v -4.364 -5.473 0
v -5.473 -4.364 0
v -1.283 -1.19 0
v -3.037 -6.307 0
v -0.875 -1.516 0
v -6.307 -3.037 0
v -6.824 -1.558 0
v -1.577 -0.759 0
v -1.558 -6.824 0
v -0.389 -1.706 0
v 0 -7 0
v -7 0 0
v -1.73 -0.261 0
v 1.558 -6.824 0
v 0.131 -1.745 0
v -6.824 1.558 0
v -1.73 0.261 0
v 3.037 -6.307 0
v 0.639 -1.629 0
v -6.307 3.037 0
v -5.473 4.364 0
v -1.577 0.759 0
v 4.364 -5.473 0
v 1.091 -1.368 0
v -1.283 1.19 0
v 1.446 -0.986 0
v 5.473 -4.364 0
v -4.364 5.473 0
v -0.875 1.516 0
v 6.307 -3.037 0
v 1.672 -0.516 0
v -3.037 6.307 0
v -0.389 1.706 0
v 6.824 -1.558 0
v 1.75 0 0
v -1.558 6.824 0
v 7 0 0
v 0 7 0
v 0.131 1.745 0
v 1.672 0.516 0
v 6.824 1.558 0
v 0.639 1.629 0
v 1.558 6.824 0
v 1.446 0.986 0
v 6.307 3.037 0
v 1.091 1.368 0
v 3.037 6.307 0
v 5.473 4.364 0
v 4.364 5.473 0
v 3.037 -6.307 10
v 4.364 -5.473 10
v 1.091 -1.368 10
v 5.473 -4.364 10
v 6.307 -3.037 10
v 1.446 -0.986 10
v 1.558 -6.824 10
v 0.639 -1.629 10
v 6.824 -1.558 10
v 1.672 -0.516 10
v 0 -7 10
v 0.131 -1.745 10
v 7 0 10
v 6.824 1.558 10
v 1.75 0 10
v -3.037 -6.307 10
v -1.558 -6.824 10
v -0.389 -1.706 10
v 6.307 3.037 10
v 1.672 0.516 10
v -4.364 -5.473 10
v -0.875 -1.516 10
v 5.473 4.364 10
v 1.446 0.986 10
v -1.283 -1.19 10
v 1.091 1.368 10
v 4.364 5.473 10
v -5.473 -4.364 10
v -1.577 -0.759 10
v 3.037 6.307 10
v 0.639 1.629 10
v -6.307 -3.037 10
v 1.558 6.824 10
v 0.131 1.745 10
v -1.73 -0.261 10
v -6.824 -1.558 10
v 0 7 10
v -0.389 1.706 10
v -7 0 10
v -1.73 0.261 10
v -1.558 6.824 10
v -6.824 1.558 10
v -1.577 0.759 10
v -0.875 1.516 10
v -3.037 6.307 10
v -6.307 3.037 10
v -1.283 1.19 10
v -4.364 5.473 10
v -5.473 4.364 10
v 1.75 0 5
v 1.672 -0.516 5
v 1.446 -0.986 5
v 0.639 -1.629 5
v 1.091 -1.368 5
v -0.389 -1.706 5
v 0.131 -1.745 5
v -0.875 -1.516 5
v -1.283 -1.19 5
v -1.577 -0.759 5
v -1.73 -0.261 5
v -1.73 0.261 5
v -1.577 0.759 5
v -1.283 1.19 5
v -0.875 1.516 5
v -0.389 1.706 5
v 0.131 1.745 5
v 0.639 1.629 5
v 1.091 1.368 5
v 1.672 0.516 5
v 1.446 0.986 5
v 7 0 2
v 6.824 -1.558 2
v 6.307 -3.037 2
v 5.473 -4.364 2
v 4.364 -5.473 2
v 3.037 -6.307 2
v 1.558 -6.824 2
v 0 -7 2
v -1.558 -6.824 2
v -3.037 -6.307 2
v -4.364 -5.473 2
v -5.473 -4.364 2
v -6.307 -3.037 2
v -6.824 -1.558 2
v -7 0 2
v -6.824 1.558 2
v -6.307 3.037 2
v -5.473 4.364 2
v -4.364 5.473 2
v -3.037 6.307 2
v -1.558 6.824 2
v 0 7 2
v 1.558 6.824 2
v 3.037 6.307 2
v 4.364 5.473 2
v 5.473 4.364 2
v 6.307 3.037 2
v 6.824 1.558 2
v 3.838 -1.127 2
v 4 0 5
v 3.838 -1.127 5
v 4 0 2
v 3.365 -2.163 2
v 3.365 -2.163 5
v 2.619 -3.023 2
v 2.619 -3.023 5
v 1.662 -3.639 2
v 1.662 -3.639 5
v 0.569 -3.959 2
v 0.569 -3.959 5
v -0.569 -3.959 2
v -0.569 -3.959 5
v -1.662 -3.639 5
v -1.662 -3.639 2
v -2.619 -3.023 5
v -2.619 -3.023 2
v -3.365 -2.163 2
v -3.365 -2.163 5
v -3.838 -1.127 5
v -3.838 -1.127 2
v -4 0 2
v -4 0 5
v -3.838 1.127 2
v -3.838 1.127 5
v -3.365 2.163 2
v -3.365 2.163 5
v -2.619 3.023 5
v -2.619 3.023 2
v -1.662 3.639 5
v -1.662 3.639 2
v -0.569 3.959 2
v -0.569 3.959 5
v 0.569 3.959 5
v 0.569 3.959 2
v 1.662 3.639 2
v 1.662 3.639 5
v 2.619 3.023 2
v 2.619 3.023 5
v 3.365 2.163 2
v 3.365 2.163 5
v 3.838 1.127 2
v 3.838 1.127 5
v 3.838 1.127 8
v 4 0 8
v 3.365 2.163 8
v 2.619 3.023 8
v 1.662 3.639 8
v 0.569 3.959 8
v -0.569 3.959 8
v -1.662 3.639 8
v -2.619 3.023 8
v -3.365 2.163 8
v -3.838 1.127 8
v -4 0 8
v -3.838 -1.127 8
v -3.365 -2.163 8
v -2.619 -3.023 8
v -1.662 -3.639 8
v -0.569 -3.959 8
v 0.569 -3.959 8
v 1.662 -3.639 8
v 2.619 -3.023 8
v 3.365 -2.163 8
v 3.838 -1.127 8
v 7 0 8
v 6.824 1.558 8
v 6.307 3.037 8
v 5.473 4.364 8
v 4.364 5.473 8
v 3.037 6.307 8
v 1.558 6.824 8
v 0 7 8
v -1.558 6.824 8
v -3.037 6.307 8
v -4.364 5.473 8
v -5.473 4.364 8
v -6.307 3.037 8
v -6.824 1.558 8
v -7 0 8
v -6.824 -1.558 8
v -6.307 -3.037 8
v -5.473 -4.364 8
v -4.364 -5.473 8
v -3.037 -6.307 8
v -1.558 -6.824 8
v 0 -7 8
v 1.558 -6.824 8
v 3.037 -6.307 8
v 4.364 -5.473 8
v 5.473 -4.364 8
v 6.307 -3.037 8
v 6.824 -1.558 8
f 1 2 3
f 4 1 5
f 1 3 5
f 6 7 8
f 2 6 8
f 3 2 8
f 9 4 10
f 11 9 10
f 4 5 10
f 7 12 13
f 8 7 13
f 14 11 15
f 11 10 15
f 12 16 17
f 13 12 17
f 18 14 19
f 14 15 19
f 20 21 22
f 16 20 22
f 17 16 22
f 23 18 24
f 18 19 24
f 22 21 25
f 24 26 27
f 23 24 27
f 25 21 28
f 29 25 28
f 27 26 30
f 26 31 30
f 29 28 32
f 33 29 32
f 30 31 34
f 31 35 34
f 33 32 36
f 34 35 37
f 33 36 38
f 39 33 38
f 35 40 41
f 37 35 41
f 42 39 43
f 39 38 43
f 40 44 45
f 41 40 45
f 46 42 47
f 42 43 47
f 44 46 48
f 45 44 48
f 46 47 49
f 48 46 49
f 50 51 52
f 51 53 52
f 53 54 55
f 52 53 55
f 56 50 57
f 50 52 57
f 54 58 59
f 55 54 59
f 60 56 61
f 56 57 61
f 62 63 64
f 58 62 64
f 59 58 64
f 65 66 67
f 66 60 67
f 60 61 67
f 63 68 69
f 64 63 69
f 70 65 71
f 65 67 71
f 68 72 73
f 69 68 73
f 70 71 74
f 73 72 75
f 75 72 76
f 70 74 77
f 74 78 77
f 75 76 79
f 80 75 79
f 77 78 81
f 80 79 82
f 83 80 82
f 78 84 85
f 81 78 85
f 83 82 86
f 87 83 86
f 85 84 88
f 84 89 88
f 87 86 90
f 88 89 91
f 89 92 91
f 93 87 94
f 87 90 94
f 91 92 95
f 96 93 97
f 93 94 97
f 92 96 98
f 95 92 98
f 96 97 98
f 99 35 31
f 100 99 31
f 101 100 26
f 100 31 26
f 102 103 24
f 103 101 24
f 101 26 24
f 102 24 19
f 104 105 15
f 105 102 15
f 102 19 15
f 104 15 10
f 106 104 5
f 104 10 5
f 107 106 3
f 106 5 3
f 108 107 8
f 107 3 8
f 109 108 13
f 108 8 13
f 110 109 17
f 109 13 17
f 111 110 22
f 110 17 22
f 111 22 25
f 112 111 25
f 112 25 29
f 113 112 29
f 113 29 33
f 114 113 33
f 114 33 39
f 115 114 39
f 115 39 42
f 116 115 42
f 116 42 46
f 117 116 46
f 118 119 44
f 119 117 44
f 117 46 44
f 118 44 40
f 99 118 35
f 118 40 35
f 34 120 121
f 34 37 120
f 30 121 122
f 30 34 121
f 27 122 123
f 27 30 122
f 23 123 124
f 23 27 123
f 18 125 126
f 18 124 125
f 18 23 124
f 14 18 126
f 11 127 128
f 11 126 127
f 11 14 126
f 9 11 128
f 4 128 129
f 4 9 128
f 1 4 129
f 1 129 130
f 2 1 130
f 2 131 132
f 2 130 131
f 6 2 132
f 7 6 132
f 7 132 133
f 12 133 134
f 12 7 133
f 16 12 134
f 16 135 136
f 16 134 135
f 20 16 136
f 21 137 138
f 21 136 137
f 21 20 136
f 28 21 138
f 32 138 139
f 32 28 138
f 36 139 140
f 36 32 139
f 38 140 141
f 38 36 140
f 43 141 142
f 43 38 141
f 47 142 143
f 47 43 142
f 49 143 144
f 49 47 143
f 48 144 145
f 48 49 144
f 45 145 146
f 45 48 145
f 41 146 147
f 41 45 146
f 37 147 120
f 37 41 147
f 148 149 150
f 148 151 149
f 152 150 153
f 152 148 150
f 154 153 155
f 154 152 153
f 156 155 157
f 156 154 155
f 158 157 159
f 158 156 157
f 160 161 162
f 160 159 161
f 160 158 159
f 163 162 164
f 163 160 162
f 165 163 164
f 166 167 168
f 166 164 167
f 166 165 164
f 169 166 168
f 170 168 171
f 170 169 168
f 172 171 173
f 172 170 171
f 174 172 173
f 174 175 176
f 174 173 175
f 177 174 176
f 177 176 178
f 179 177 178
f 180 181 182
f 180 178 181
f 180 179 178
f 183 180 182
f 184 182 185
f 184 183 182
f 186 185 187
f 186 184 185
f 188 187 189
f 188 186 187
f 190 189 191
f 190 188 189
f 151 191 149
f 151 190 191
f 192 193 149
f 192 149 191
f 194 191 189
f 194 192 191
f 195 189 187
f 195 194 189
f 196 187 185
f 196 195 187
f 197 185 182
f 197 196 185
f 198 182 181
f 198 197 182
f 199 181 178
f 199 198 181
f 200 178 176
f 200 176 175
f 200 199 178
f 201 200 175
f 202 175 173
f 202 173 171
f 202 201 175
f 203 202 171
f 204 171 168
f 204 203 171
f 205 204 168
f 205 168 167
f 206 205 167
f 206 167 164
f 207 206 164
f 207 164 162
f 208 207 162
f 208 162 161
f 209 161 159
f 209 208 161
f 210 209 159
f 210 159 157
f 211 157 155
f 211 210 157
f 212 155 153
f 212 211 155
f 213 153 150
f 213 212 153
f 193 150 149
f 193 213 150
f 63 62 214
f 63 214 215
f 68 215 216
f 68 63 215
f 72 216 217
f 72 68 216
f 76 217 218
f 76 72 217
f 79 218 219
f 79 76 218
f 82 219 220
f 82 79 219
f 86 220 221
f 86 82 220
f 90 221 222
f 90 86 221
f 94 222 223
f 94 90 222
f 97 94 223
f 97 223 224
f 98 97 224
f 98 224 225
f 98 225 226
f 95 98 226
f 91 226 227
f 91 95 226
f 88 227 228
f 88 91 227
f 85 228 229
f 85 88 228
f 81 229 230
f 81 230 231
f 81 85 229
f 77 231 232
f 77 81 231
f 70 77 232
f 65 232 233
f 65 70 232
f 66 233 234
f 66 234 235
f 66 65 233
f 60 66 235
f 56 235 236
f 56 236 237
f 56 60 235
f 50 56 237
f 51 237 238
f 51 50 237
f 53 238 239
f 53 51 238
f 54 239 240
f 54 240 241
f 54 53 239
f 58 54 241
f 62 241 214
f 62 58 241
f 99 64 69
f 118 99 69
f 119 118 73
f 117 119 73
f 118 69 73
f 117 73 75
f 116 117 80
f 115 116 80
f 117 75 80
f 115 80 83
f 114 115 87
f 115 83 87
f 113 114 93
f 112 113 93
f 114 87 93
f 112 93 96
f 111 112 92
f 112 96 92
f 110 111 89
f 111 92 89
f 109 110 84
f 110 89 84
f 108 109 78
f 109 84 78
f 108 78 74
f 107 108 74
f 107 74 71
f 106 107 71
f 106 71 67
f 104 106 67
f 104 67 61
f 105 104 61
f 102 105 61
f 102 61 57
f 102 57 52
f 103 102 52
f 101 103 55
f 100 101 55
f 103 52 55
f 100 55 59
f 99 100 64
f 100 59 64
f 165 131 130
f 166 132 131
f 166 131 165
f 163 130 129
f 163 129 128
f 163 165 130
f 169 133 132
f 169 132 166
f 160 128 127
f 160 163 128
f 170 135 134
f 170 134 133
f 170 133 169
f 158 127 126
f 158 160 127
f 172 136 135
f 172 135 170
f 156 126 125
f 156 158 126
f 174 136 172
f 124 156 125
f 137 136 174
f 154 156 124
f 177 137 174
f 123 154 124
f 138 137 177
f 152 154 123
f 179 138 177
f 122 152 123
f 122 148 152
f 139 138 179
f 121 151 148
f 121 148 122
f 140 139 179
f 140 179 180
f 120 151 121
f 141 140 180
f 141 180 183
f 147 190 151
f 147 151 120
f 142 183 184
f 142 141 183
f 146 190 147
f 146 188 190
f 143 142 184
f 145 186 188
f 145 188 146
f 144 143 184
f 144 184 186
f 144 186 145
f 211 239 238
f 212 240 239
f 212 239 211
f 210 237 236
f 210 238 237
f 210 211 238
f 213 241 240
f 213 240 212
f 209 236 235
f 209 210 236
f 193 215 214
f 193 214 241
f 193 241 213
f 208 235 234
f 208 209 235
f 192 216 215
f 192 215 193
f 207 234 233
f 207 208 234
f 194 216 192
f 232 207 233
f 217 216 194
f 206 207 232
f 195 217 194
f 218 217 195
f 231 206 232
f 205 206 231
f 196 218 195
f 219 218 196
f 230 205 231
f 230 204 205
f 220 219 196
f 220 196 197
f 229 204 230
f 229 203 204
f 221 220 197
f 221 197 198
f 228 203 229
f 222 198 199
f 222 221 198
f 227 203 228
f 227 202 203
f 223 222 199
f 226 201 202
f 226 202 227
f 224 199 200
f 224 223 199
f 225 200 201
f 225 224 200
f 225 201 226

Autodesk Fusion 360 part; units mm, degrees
sketch "Esquisse1" plane through (0, 0, 0) normal (0, 0, 1) x (1, 0, 0)
  circle A0 centre (0, 0) radius 1.75
  circle A1 centre (0, 0) radius 4
  circle A2 centre (0, 0) radius 7
  dimension "d1" = 3.5
  dimension "d10" = 8
  dimension "d11" = 3
extrude "Extrusion2" add sketch "Esquisse1" along normal blind 5 contours A1
extrude "Extrusion3" add sketch "Esquisse1" along normal blind 2 contours A2
mirror "Symétrie miroir2" about plane through (0, 0, 5) normal (0, 0, 1) of bodies 1 merged
